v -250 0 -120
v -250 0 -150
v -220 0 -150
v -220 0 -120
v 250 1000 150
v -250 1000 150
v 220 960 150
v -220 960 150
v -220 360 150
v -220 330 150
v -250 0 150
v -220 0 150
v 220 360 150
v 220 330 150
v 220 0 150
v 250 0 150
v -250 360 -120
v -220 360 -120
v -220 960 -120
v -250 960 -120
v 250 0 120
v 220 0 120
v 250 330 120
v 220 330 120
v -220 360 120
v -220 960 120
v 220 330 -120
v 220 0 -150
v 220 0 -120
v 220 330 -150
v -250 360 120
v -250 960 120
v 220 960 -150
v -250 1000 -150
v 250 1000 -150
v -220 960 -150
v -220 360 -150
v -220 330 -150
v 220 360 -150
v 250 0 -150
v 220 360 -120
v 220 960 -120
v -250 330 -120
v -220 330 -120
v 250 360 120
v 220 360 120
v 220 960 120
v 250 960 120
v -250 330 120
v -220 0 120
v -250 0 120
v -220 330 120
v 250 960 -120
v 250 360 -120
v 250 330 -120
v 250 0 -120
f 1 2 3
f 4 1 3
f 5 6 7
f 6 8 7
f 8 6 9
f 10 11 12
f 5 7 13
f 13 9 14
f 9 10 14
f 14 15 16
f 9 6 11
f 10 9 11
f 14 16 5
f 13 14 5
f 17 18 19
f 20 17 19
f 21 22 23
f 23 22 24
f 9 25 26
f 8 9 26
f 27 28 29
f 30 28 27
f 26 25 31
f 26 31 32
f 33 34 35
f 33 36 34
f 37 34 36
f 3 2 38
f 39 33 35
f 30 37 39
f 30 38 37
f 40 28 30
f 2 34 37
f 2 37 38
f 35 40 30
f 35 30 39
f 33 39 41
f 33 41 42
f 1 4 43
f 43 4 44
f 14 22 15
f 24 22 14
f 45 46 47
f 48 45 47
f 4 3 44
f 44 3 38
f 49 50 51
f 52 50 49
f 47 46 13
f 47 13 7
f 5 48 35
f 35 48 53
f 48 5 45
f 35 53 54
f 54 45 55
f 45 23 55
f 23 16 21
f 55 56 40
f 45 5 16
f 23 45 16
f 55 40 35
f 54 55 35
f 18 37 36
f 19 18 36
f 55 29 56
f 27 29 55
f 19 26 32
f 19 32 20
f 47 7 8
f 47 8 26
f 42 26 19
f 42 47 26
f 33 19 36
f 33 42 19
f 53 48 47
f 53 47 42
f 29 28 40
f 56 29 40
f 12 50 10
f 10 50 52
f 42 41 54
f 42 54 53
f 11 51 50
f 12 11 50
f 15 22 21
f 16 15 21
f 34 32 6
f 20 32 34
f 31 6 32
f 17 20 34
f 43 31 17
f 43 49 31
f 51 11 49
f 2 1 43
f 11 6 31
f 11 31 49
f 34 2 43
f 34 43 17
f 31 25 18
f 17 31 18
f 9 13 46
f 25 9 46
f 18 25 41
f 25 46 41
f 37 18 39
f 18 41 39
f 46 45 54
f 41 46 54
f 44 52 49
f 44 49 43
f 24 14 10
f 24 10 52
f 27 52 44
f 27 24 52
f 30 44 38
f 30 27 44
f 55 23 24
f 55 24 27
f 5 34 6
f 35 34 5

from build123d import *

# Parameters (mm, degrees)
SKETCH1_W               = 500
SKETCH1_H               = 300
BOSS_EXTRUDE1_DEPTH     = 1000
SKETCH2_W               = 440
SKETCH2_H               = 600
CUT_EXTRUDE1_DEPTH      = 1000
CUT_EXTRUDE1_DEPTH_BACK = 1000
SKETCH3_W               = 440
SKETCH3_H               = 330
CUT_EXTRUDE2_DEPTH      = 1000
CUT_EXTRUDE2_DEPTH_BACK = 1000
SKETCH4_W               = 240
SKETCH4_H               = 600
CUT_EXTRUDE3_DEPTH      = 1000
CUT_EXTRUDE3_DEPTH_BACK = 1000
SKETCH5_W               = 240
SKETCH5_H               = 330
CUT_EXTRUDE4_DEPTH      = 1000
CUT_EXTRUDE4_DEPTH_BACK = 1000


with BuildPart() as part:
    # Sketch1 → Boss-Extrude1 (new body)
    with BuildSketch(Plane(origin=(0, 0, 0), x_dir=(1, 0, 0), z_dir=(0, 1, 0))):
        Rectangle(SKETCH1_W, SKETCH1_H)
    extrude(amount=BOSS_EXTRUDE1_DEPTH)

    # Sketch2 → Cut-Extrude1 (cut, two sides)
    with BuildSketch(Plane.XY) as cut_extrude1_sk:
        with Locations((0, 660)):
            Rectangle(SKETCH2_W, SKETCH2_H)
    extrude(amount=CUT_EXTRUDE1_DEPTH, mode=Mode.SUBTRACT)
    extrude(cut_extrude1_sk.sketch, amount=-CUT_EXTRUDE1_DEPTH_BACK, mode=Mode.SUBTRACT)

    # Sketch3 → Cut-Extrude2 (cut, two sides)
    with BuildSketch(Plane.XY) as cut_extrude2_sk:
        with Locations((0, 165)):
            Rectangle(SKETCH3_W, SKETCH3_H)
    extrude(amount=CUT_EXTRUDE2_DEPTH, mode=Mode.SUBTRACT)
    extrude(cut_extrude2_sk.sketch, amount=-CUT_EXTRUDE2_DEPTH_BACK, mode=Mode.SUBTRACT)

    # Sketch4 → Cut-Extrude3 (cut, two sides)
    with BuildSketch(Plane(origin=(0, 0, 0), x_dir=(0, 0, -1), z_dir=(1, 0, 0))) as cut_extrude3_sk:
        with Locations((0, 660)):
            Rectangle(SKETCH4_W, SKETCH4_H)
    extrude(amount=CUT_EXTRUDE3_DEPTH, mode=Mode.SUBTRACT)
    extrude(cut_extrude3_sk.sketch, amount=-CUT_EXTRUDE3_DEPTH_BACK, mode=Mode.SUBTRACT)

    # Sketch5 → Cut-Extrude4 (cut, two sides)
    with BuildSketch(Plane(origin=(0, 0, 0), x_dir=(0, 0, -1), z_dir=(1, 0, 0))) as cut_extrude4_sk:
        with Locations((0, 165)):
            Rectangle(SKETCH5_W, SKETCH5_H)
    extrude(amount=CUT_EXTRUDE4_DEPTH, mode=Mode.SUBTRACT)
    extrude(cut_extrude4_sk.sketch, amount=-CUT_EXTRUDE4_DEPTH_BACK, mode=Mode.SUBTRACT)


solid = part.part
